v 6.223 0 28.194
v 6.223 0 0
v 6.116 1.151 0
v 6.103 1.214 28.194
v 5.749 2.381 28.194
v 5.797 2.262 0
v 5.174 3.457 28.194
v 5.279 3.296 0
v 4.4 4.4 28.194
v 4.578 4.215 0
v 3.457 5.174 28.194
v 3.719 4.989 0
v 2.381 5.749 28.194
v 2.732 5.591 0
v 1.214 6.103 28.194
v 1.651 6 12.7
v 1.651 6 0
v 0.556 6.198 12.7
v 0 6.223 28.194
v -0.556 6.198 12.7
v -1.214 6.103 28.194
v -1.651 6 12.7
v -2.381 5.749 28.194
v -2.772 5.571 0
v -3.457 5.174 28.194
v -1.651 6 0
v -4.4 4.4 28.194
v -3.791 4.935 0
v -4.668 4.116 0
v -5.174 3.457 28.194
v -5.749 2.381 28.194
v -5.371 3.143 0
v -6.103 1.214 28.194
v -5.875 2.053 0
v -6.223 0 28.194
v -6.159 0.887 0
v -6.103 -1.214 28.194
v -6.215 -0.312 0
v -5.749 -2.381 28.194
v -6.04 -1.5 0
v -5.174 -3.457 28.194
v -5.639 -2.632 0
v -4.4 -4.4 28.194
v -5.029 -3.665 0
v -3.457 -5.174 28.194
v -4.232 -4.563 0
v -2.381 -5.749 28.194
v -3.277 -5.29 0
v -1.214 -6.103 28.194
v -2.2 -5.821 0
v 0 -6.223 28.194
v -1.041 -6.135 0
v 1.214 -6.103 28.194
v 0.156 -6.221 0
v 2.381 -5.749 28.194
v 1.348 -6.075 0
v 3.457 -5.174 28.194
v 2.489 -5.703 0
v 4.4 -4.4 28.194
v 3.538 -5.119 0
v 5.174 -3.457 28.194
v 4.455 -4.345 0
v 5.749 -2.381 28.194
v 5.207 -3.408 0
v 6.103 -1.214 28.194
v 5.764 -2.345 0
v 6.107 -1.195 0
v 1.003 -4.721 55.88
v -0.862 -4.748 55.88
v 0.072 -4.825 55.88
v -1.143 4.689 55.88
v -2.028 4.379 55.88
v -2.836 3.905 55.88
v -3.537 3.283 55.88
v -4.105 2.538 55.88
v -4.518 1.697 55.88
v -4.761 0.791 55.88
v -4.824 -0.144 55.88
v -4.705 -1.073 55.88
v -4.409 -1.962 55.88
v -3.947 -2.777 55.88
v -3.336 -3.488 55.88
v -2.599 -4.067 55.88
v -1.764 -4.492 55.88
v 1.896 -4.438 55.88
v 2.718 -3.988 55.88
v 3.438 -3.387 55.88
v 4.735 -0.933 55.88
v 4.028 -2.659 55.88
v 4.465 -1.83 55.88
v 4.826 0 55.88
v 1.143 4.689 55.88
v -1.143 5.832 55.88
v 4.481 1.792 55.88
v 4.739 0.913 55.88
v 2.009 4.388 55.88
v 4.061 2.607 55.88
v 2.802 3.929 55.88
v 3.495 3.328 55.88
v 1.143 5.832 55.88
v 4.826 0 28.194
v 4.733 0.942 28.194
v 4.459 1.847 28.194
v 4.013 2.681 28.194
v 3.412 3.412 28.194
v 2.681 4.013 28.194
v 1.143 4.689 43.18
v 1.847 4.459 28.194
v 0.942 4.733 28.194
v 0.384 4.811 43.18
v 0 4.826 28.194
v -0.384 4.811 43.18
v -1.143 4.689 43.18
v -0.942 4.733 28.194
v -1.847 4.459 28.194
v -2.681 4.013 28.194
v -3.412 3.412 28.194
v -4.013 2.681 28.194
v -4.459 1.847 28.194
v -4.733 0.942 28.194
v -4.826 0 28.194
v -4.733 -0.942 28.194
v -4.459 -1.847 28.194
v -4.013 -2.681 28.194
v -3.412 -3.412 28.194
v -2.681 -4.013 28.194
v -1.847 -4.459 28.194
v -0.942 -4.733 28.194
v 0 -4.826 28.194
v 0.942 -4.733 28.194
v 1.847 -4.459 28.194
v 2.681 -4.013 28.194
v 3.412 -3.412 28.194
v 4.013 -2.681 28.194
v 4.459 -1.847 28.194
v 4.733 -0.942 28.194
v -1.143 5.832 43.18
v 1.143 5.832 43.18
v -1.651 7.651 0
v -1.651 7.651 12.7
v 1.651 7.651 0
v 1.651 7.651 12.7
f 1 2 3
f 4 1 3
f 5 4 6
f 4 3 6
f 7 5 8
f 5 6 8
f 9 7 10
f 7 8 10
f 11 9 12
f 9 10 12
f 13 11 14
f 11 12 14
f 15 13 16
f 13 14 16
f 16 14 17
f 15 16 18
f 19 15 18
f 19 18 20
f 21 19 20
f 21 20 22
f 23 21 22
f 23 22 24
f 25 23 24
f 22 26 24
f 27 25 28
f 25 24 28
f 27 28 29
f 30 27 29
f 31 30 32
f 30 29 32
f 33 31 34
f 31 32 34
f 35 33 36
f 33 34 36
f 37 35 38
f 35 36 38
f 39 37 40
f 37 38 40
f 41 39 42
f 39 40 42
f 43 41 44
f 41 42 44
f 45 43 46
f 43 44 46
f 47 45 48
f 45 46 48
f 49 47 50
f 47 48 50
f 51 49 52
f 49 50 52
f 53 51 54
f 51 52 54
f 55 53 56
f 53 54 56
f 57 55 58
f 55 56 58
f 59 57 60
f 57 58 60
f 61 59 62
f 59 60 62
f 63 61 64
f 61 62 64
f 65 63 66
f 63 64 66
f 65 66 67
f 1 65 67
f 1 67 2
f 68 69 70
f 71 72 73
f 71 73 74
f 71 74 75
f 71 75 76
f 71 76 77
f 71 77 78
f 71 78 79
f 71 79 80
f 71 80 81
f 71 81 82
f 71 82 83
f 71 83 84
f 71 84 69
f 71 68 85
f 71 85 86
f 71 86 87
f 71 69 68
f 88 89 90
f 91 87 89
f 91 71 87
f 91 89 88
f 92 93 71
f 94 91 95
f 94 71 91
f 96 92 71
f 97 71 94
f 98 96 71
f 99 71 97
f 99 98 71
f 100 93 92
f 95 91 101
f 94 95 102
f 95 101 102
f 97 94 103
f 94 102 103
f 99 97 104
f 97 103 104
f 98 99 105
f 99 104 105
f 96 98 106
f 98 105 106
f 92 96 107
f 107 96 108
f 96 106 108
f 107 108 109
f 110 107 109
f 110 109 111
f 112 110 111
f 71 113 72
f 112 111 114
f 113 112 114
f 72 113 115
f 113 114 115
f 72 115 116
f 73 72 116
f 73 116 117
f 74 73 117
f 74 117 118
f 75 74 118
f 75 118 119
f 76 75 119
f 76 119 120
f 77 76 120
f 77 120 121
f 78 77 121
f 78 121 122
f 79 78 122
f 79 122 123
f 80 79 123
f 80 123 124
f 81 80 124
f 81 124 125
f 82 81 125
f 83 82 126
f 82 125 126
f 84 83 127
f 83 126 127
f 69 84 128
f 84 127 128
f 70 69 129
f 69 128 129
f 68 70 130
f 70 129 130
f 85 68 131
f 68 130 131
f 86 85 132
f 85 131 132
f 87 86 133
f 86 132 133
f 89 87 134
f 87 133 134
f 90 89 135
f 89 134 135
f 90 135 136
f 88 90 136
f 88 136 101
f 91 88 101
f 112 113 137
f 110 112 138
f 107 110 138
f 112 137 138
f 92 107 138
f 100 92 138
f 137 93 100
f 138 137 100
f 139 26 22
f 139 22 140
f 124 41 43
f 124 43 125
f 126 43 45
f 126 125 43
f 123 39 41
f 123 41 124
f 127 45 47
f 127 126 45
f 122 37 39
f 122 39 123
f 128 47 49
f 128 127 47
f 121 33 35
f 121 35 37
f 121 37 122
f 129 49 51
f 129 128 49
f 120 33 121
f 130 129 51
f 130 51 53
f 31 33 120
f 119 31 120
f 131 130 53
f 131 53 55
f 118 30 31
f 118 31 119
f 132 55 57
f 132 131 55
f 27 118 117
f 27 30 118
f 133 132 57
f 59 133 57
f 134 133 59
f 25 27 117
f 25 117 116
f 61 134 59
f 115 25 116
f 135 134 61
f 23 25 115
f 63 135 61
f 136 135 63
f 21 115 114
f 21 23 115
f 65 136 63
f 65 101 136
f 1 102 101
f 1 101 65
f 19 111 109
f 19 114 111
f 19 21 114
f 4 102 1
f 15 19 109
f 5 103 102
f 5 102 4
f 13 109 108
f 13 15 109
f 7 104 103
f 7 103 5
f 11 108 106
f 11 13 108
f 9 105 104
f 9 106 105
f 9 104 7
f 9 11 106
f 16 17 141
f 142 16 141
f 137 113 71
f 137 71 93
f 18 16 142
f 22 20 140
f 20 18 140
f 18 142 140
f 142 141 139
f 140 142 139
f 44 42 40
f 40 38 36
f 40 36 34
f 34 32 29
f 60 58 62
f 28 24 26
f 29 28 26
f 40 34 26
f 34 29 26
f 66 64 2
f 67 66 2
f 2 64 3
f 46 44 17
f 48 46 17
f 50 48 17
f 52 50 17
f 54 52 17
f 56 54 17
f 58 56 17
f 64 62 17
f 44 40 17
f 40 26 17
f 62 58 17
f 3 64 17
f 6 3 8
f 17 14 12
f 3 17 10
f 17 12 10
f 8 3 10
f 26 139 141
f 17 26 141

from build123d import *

# Parameters (mm, degrees)
SKETCH1_R                = 6.223
BOSS_EXTRUDE1_DEPTH      = 28.194
SKETCH2_R                = 4.826
BOSS_EXTRUDE2_DEPTH      = 27.686
BOSS_EXTRUDE2_DEPTH_BACK = 5.08
SKETCH3_W                = 2.286
SKETCH3_H                = 2.286
BOSS_EXTRUDE3_DEPTH      = 12.7
SKETCH4_W                = 3.302
SKETCH4_H                = 3.302
BOSS_EXTRUDE4_DEPTH      = 12.7


with BuildPart() as part:
    # Sketch1 → Boss-Extrude1 (new body)
    with BuildSketch(Plane.XY):
        Circle(SKETCH1_R)
    extrude(amount=BOSS_EXTRUDE1_DEPTH)

    # Sketch2 → Boss-Extrude2 (add, two sides)
    with BuildSketch(Plane.XY.offset(28.194)) as boss_extrude2_sk:
        Circle(SKETCH2_R)
    extrude(amount=BOSS_EXTRUDE2_DEPTH)
    extrude(boss_extrude2_sk.sketch, amount=-BOSS_EXTRUDE2_DEPTH_BACK)

    # Sketch3 → Boss-Extrude3 (add)
    with BuildSketch(Plane.XY.offset(55.88)):
        with Locations((0, 4.688691395)):
            Rectangle(SKETCH3_W, SKETCH3_H)
    extrude(amount=-BOSS_EXTRUDE3_DEPTH)

    # Sketch4 → Boss-Extrude4 (add)
    with BuildSketch(Plane(origin=(0, 0, 0), x_dir=(-1, 0, 0), z_dir=(0, 0, -1))):
        with Locations((0, 5.999994)):
            Rectangle(SKETCH4_W, SKETCH4_H)
    extrude(amount=-BOSS_EXTRUDE4_DEPTH)


solid = part.part
